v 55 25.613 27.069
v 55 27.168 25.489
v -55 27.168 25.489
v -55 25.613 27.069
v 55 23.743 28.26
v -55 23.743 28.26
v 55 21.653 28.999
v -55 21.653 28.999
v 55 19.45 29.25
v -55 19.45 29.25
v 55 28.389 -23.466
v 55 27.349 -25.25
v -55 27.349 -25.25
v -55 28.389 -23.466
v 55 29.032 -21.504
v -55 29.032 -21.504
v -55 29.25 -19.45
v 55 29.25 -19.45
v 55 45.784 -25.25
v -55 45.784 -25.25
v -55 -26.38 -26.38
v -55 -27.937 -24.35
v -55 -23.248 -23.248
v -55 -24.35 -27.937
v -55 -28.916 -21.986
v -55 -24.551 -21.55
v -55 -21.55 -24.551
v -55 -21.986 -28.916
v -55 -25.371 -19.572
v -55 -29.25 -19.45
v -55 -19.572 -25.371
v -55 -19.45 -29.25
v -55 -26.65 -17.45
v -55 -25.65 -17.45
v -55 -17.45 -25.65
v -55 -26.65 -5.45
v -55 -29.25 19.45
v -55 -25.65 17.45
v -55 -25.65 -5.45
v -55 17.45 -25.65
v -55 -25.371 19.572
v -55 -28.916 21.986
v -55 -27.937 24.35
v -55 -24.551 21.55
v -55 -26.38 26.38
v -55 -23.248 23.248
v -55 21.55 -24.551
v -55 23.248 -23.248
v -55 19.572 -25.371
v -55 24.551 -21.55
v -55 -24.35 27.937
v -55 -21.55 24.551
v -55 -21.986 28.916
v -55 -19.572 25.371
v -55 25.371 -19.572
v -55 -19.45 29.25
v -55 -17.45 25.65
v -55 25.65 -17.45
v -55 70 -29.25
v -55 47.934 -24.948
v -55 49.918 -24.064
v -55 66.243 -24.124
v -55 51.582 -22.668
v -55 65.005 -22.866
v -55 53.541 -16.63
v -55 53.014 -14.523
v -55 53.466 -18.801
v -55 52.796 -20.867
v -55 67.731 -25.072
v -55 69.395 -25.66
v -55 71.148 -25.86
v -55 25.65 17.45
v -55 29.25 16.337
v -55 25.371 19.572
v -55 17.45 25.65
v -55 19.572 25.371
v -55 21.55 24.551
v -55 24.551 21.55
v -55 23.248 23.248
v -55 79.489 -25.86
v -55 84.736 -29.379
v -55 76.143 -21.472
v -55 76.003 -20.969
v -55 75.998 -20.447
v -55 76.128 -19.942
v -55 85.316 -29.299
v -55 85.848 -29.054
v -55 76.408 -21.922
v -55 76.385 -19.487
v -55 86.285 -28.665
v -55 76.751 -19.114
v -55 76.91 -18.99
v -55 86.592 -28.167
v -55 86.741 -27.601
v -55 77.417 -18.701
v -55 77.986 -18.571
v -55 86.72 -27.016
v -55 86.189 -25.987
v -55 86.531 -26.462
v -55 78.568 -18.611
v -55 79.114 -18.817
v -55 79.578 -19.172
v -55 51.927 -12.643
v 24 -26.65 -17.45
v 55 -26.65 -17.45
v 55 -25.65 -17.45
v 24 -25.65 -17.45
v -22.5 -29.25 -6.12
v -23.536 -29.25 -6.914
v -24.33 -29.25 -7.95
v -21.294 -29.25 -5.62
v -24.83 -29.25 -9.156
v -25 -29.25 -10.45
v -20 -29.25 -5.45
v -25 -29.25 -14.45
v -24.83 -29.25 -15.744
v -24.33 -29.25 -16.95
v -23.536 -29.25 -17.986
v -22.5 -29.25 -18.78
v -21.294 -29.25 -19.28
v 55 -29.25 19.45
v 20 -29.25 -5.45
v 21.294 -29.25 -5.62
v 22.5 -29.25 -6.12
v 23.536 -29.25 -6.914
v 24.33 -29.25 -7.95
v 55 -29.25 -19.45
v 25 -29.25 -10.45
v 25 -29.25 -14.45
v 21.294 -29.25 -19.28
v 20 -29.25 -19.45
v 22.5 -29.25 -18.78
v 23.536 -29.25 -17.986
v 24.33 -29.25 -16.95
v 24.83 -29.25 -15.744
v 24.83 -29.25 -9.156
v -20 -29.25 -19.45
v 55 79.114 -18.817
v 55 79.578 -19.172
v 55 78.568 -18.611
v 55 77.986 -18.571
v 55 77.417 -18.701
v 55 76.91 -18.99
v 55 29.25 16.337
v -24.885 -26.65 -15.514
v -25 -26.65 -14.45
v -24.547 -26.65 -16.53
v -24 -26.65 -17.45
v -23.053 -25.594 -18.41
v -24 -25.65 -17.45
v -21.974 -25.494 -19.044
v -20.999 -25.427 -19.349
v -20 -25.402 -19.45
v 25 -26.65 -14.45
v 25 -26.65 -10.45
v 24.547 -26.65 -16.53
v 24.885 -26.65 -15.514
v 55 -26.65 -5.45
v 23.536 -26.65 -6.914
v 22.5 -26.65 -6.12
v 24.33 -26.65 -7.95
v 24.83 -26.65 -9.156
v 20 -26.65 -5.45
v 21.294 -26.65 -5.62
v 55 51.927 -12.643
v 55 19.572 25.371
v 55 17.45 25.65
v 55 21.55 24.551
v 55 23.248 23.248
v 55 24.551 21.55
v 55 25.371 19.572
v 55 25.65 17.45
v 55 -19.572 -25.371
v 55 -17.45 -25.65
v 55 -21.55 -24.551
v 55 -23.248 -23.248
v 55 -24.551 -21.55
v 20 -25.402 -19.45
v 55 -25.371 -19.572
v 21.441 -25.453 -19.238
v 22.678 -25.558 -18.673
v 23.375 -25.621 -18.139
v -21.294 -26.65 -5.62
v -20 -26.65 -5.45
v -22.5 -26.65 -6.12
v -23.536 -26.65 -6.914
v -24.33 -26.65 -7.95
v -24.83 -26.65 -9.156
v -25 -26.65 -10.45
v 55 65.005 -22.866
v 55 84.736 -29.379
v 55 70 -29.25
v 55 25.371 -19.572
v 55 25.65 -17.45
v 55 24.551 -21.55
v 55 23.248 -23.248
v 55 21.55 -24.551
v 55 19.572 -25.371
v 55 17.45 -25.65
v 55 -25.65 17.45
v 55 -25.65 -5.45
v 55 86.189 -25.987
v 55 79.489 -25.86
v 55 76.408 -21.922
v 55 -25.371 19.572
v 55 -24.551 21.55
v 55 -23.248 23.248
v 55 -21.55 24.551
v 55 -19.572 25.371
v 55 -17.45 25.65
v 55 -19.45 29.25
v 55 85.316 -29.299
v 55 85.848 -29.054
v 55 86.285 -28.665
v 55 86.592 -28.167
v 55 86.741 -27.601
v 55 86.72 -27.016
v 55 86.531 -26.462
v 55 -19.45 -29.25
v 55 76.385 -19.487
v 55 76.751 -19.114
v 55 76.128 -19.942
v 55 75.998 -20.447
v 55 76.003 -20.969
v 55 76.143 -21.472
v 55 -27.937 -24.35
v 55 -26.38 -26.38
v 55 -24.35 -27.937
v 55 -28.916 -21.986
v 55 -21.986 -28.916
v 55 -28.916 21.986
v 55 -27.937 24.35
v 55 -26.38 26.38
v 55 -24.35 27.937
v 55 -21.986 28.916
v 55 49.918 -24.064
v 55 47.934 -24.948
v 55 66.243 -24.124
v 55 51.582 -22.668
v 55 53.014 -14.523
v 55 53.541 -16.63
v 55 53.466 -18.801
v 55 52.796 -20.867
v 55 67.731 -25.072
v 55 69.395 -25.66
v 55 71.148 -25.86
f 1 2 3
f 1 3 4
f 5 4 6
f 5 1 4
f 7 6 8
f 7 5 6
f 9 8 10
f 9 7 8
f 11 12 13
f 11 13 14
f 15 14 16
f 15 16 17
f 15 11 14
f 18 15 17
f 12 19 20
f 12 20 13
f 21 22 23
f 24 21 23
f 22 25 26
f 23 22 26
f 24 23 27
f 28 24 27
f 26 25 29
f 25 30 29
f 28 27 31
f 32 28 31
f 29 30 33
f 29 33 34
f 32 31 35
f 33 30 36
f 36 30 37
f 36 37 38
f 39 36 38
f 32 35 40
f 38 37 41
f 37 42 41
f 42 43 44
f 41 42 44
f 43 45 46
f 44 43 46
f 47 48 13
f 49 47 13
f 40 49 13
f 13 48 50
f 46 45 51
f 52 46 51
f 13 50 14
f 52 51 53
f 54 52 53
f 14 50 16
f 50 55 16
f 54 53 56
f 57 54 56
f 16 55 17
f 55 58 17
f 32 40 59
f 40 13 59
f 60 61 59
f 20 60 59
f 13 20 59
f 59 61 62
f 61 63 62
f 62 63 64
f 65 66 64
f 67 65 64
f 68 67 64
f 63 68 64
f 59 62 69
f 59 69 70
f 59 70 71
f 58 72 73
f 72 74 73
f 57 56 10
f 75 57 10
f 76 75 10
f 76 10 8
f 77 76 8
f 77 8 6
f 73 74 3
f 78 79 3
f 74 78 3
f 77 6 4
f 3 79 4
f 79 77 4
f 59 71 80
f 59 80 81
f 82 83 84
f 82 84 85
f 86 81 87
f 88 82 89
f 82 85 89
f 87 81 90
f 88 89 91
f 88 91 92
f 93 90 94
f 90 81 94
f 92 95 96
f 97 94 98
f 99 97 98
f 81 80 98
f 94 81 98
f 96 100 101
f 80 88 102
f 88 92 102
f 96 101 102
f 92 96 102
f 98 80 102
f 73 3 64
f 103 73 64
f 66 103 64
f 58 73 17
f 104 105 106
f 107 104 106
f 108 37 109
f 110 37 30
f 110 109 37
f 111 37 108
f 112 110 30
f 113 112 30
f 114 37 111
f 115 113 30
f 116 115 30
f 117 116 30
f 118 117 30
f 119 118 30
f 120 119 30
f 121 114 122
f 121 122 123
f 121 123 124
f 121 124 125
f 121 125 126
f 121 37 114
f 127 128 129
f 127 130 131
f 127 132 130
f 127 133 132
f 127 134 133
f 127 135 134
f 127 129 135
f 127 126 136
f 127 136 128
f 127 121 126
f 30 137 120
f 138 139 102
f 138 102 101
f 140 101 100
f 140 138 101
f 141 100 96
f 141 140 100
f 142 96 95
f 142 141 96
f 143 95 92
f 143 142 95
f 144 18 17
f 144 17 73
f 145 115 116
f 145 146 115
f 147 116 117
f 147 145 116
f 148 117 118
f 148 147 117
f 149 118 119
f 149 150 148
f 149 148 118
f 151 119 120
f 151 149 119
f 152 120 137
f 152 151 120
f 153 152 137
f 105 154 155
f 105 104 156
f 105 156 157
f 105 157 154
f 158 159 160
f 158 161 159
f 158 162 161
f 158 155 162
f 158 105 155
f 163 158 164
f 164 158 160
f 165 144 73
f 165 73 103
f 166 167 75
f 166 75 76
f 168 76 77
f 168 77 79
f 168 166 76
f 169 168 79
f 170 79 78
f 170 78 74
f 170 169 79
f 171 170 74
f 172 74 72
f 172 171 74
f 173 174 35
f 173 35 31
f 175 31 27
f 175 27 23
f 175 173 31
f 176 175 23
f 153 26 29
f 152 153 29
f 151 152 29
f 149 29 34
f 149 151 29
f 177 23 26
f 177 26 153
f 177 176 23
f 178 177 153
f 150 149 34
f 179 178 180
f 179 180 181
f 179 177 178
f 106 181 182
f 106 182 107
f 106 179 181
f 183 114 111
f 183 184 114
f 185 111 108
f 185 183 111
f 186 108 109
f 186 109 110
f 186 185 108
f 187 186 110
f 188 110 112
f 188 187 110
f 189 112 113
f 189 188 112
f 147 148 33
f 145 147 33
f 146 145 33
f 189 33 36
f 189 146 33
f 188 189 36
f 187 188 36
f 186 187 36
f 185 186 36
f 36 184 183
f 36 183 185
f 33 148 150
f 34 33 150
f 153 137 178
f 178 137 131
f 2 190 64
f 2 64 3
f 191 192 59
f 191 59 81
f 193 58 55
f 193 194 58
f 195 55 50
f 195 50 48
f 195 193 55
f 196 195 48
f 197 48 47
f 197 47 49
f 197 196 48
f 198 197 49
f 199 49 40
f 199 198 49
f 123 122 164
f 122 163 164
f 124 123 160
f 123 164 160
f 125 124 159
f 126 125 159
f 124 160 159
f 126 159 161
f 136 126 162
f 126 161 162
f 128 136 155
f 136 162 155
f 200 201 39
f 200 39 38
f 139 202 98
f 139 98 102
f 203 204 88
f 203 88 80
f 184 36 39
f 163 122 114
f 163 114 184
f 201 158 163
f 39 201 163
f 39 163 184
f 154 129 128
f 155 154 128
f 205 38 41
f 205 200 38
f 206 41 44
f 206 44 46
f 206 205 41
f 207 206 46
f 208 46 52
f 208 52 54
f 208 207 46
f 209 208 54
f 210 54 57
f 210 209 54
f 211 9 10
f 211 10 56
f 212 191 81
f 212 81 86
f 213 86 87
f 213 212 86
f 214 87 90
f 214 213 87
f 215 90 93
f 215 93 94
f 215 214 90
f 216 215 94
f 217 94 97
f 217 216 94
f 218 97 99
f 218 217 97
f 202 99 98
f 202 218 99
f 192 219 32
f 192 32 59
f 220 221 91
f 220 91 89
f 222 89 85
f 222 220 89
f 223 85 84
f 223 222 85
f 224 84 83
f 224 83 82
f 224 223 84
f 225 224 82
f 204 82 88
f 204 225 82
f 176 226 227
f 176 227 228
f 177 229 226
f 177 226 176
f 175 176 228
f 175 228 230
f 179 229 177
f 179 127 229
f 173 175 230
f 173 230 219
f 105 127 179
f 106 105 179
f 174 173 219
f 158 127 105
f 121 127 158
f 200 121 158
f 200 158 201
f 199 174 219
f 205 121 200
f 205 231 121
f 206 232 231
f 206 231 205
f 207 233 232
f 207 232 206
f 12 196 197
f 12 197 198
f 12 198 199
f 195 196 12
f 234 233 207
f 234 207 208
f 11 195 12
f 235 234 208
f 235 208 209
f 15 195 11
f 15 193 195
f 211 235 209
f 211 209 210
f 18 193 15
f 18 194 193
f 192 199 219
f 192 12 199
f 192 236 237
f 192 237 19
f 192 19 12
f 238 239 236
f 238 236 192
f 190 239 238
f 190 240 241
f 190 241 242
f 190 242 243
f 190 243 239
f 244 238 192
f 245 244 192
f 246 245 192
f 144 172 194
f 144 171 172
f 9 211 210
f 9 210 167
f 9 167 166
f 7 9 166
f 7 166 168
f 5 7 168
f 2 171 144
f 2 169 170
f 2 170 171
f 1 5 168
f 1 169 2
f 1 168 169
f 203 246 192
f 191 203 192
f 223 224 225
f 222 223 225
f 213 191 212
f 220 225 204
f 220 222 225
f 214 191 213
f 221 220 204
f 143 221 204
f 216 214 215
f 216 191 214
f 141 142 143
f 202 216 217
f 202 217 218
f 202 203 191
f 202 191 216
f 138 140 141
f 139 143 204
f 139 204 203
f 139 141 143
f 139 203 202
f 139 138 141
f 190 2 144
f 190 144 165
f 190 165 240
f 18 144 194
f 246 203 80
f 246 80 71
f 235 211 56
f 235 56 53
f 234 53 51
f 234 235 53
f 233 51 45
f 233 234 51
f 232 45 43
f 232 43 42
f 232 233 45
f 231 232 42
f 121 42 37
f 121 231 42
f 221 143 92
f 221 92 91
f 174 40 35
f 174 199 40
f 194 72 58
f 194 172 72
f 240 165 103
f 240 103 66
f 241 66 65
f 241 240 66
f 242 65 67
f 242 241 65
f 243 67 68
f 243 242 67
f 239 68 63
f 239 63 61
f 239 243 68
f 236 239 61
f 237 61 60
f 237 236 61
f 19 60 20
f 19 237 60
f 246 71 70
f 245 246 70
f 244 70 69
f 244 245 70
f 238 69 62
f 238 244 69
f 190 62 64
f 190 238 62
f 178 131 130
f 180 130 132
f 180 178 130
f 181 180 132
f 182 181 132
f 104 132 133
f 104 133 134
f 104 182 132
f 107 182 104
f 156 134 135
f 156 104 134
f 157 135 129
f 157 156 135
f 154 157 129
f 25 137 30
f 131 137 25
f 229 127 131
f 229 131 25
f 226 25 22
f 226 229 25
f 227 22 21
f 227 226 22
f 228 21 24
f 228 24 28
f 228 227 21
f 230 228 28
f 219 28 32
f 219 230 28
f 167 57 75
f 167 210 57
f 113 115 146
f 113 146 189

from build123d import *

# Parameters (mm, degrees)
F1_DEPTH = 55
F2_W     = 50
F2_H     = 14
F3_DEPTH = 5
F4_W     = 1
F4_H     = 12
F5_DEPTH = 112
F7_DEPTH = 110
F8_R     = 5


with BuildPart() as f1:
    # F0 (on Right) → F1 (new body, symmetric)
    with BuildSketch(Plane.YZ):
        with BuildLine():
            Line((29.25, -19.45), (29.25, 19.45))
            ThreePointArc((29.25, 19.45), (26.3796464556, 26.3796464556), (19.45, 29.25))
            Line((19.45, 29.25), (-19.45, 29.25))
            ThreePointArc((-19.45, 29.25), (-26.3796464556, 26.3796464556), (-29.25, 19.45))
            Line((-29.25, 19.45), (-29.25, -19.45))
            ThreePointArc((-29.25, -19.45), (-26.3796464556, -26.3796464556), (-19.45, -29.25))
            Line((-19.45, -29.25), (19.45, -29.25))
            ThreePointArc((19.45, -29.25), (26.3796464556, -26.3796464556), (29.25, -19.45))
        make_face()
        with BuildLine():
            ThreePointArc((17.45, 25.6500001997), (23.2482757469, 23.2482757469), (25.6500001997, 17.45))
            Line((25.6500001997, 17.45), (25.6500001997, -17.45))
            ThreePointArc((25.6500001997, -17.45), (23.2482757469, -23.2482757469), (17.45, -25.6500001997))
            Line((17.45, -25.6500001997), (-17.45, -25.6500001997))
            ThreePointArc((-17.45, -25.6500001997), (-23.2482757469, -23.2482757469), (-25.6500001997, -17.45))
            Line((-25.6500001997, -17.45), (-25.6500001997, 17.45))
            ThreePointArc((-25.6500001997, 17.45), (-23.2482757469, 23.2482757469), (-17.45, 25.6500001997))
            Line((-17.45, 25.6500001997), (17.45, 25.6500001997))
        make_face(mode=Mode.SUBTRACT)
    extrude(amount=F1_DEPTH, both=True)

    # F2 (on face) → F3 (cut)
    with BuildSketch(Plane.XZ.offset(29.25)):
        with Locations((0, -12.45)):
            Rectangle(F2_W, F2_H)
    extrude(amount=-F3_DEPTH, mode=Mode.SUBTRACT)

    # F4 (on face) → F5 (cut)
    with BuildSketch(Plane.YZ.offset(55)):
        with Locations((-26.1500001997, -11.45)):
            Rectangle(F4_W, F4_H)
    extrude(amount=-F5_DEPTH, mode=Mode.SUBTRACT)

    # F6 (on face) → F7 (join)
    with BuildSketch(Plane.YZ.offset(55)):
        with BuildLine():
            ThreePointArc((27.3493670633, -25.25), (23.8771887242, -28.1929971978), (19.45, -29.25))
            Line((19.45, -29.25), (70, -29.25))
            Line((70, -29.25), (84.7360996039, -29.3794282716))
            ThreePointArc((84.7360996039, -29.3794282716), (86.5921446829, -28.1669015856), (86.1891008154, -25.98683738))
            Line((86.1891008154, -25.98683738), (79.577611796, -19.1723148788))
            ThreePointArc((79.577611796, -19.1723148788), (78.278627167, -18.5696430639), (76.9096917505, -18.9898694416))
            Line((76.9096917505, -18.9898694416), (76.7505439798, -19.1143983305))
            ThreePointArc((76.7505439798, -19.1143983305), (75.997756862, -20.4472363949), (76.4079148199, -21.9219961042))
            Line((76.4079148199, -21.9219961042), (79.4891255871, -25.8597797712))
            Line((79.4891255871, -25.8597797712), (71.1479993126, -25.8597797712))
            ThreePointArc((71.1479993126, -25.8597797712), (67.7312883661, -25.0716330431), (65.0050567922, -22.8664685681))
            Line((65.0050567922, -22.8664685681), (27.1680559872, 25.4891731038))
            ThreePointArc((27.1680559872, 25.4891731038), (28.7149055223, 22.6439827273), (29.25, 19.45))
            Line((29.25, 19.45), (29.25, 16.3374962926))
            Line((29.25, 16.3374962926), (51.9267094517, -12.6433112031))
            ThreePointArc((51.9267094517, -12.6433112031), (52.7956202032, -20.8667109465), (45.7837669312, -25.25))
            Line((45.7837669312, -25.25), (27.3493670633, -25.25))
        make_face()
    extrude(amount=-F7_DEPTH)

    # F8
    f8_edges = [f1.edges().sort_by_distance(p)[0] for p in [
        (-25, -27.95, -5.45),
        (-25, -27.326179, -19.45),
        (25, -27.326179, -19.45),
        (25, -27.95, -5.45),
    ]]
    fillet(f8_edges, radius=F8_R)


solid = f1.part
